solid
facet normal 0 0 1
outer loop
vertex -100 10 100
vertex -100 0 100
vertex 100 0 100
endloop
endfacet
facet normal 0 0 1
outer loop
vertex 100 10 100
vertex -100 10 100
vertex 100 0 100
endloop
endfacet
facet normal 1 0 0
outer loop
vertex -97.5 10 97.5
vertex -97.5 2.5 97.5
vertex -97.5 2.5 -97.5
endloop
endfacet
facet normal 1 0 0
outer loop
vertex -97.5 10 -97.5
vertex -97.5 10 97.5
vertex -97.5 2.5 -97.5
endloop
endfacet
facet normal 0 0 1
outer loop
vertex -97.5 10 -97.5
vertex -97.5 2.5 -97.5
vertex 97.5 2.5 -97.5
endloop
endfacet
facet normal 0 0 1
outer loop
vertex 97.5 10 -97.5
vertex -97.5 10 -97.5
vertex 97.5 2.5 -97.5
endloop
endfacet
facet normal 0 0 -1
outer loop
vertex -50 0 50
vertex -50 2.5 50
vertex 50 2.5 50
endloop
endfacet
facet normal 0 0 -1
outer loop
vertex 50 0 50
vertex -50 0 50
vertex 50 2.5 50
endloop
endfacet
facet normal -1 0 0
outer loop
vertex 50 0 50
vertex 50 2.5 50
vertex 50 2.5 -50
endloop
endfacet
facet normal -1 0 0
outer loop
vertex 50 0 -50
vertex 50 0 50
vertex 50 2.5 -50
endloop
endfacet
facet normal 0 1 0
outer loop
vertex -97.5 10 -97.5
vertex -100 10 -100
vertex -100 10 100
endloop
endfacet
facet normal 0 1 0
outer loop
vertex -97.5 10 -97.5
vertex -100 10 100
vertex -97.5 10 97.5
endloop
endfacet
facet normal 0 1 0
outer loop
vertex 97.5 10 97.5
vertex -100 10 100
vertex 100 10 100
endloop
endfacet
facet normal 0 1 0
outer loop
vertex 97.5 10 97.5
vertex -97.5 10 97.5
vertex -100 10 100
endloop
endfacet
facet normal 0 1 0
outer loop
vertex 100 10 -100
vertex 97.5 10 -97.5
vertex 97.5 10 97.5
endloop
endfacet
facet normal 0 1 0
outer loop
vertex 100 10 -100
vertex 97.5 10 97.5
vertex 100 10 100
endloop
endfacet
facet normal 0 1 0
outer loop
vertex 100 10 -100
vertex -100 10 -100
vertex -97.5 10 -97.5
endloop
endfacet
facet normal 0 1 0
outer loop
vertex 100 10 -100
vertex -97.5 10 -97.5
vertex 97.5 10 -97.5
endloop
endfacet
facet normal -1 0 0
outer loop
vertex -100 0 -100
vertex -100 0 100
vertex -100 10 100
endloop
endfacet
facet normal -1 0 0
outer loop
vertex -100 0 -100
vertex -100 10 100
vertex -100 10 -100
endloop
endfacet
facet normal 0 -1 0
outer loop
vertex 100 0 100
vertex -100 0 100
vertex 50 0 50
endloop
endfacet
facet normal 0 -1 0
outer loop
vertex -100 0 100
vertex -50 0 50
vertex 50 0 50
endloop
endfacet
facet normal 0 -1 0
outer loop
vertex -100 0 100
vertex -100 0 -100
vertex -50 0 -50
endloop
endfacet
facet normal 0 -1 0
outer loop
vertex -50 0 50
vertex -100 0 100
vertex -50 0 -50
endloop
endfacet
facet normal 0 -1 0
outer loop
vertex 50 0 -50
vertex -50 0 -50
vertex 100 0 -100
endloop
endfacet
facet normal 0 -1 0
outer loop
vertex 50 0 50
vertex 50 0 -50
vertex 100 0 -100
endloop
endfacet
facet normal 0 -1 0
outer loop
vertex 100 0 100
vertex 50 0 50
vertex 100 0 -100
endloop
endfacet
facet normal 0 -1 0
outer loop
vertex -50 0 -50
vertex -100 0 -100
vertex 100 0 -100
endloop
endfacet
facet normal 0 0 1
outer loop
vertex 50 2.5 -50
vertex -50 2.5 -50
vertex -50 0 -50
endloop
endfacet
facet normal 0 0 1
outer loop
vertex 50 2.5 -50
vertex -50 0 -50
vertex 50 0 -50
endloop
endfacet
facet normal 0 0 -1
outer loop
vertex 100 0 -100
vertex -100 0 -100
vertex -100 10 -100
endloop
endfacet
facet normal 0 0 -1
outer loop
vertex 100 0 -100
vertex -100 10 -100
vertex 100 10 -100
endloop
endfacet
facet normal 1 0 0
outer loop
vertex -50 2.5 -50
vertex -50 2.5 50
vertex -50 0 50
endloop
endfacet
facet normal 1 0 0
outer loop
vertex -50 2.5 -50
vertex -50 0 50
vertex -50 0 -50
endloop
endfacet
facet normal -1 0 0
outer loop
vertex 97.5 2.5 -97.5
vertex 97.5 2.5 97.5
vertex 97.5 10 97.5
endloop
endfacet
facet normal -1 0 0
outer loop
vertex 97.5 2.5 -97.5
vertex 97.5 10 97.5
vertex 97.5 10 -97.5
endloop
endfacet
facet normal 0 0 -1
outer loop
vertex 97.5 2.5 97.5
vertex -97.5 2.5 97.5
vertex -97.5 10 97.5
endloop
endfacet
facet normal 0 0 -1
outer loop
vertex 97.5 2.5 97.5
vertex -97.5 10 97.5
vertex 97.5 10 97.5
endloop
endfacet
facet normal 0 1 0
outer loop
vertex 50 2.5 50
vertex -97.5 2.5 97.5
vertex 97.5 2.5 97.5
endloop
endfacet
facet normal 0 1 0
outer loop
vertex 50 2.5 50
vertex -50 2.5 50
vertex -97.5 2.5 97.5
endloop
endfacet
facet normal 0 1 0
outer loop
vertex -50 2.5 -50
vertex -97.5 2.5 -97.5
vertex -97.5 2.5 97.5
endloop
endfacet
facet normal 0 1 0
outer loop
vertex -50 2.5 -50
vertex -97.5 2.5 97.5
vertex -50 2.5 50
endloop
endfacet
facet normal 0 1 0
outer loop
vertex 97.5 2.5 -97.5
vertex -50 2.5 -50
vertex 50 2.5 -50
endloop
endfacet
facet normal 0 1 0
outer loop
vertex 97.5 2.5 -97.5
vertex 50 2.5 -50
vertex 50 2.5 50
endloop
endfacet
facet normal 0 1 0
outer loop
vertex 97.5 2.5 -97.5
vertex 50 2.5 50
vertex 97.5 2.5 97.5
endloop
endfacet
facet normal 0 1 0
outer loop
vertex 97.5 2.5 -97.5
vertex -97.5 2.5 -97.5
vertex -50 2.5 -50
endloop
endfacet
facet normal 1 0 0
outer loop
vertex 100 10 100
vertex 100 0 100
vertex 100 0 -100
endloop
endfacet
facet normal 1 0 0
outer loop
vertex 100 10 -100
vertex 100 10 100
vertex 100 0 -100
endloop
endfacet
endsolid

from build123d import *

# Parameters (mm, degrees)
SKETCH1_W           = 200
SKETCH1_H           = 200
BOSS_EXTRUDE1_DEPTH = 10
SHELL1_T            = -2.5
SKETCH2_W           = 100
SKETCH2_H           = 100
CUT_EXTRUDE1_DEPTH  = 142.620090383


with BuildPart() as part:
    # Sketch1 → Boss-Extrude1 (new body)
    with BuildSketch(Plane(origin=(0, 0, 0), x_dir=(1, 0, 0), z_dir=(0, 1, 0))):
        Rectangle(SKETCH1_W, SKETCH1_H)
    extrude(amount=BOSS_EXTRUDE1_DEPTH)

    # Shell1
    shell1_openings = [part.faces().sort_by_distance(p)[0] for p in [
        (0, 10, 0),
    ]]
    offset(amount=SHELL1_T, openings=shell1_openings, kind=Kind.INTERSECTION)

    # Sketch2 → Cut-Extrude1 (cut, through all)
    with BuildSketch(Plane(origin=(0, 2.5, 0), x_dir=(1, 0, 0), z_dir=(0, 1, 0))):
        Rectangle(SKETCH2_W, SKETCH2_H)
    extrude(amount=-CUT_EXTRUDE1_DEPTH, mode=Mode.SUBTRACT)


solid = part.part
